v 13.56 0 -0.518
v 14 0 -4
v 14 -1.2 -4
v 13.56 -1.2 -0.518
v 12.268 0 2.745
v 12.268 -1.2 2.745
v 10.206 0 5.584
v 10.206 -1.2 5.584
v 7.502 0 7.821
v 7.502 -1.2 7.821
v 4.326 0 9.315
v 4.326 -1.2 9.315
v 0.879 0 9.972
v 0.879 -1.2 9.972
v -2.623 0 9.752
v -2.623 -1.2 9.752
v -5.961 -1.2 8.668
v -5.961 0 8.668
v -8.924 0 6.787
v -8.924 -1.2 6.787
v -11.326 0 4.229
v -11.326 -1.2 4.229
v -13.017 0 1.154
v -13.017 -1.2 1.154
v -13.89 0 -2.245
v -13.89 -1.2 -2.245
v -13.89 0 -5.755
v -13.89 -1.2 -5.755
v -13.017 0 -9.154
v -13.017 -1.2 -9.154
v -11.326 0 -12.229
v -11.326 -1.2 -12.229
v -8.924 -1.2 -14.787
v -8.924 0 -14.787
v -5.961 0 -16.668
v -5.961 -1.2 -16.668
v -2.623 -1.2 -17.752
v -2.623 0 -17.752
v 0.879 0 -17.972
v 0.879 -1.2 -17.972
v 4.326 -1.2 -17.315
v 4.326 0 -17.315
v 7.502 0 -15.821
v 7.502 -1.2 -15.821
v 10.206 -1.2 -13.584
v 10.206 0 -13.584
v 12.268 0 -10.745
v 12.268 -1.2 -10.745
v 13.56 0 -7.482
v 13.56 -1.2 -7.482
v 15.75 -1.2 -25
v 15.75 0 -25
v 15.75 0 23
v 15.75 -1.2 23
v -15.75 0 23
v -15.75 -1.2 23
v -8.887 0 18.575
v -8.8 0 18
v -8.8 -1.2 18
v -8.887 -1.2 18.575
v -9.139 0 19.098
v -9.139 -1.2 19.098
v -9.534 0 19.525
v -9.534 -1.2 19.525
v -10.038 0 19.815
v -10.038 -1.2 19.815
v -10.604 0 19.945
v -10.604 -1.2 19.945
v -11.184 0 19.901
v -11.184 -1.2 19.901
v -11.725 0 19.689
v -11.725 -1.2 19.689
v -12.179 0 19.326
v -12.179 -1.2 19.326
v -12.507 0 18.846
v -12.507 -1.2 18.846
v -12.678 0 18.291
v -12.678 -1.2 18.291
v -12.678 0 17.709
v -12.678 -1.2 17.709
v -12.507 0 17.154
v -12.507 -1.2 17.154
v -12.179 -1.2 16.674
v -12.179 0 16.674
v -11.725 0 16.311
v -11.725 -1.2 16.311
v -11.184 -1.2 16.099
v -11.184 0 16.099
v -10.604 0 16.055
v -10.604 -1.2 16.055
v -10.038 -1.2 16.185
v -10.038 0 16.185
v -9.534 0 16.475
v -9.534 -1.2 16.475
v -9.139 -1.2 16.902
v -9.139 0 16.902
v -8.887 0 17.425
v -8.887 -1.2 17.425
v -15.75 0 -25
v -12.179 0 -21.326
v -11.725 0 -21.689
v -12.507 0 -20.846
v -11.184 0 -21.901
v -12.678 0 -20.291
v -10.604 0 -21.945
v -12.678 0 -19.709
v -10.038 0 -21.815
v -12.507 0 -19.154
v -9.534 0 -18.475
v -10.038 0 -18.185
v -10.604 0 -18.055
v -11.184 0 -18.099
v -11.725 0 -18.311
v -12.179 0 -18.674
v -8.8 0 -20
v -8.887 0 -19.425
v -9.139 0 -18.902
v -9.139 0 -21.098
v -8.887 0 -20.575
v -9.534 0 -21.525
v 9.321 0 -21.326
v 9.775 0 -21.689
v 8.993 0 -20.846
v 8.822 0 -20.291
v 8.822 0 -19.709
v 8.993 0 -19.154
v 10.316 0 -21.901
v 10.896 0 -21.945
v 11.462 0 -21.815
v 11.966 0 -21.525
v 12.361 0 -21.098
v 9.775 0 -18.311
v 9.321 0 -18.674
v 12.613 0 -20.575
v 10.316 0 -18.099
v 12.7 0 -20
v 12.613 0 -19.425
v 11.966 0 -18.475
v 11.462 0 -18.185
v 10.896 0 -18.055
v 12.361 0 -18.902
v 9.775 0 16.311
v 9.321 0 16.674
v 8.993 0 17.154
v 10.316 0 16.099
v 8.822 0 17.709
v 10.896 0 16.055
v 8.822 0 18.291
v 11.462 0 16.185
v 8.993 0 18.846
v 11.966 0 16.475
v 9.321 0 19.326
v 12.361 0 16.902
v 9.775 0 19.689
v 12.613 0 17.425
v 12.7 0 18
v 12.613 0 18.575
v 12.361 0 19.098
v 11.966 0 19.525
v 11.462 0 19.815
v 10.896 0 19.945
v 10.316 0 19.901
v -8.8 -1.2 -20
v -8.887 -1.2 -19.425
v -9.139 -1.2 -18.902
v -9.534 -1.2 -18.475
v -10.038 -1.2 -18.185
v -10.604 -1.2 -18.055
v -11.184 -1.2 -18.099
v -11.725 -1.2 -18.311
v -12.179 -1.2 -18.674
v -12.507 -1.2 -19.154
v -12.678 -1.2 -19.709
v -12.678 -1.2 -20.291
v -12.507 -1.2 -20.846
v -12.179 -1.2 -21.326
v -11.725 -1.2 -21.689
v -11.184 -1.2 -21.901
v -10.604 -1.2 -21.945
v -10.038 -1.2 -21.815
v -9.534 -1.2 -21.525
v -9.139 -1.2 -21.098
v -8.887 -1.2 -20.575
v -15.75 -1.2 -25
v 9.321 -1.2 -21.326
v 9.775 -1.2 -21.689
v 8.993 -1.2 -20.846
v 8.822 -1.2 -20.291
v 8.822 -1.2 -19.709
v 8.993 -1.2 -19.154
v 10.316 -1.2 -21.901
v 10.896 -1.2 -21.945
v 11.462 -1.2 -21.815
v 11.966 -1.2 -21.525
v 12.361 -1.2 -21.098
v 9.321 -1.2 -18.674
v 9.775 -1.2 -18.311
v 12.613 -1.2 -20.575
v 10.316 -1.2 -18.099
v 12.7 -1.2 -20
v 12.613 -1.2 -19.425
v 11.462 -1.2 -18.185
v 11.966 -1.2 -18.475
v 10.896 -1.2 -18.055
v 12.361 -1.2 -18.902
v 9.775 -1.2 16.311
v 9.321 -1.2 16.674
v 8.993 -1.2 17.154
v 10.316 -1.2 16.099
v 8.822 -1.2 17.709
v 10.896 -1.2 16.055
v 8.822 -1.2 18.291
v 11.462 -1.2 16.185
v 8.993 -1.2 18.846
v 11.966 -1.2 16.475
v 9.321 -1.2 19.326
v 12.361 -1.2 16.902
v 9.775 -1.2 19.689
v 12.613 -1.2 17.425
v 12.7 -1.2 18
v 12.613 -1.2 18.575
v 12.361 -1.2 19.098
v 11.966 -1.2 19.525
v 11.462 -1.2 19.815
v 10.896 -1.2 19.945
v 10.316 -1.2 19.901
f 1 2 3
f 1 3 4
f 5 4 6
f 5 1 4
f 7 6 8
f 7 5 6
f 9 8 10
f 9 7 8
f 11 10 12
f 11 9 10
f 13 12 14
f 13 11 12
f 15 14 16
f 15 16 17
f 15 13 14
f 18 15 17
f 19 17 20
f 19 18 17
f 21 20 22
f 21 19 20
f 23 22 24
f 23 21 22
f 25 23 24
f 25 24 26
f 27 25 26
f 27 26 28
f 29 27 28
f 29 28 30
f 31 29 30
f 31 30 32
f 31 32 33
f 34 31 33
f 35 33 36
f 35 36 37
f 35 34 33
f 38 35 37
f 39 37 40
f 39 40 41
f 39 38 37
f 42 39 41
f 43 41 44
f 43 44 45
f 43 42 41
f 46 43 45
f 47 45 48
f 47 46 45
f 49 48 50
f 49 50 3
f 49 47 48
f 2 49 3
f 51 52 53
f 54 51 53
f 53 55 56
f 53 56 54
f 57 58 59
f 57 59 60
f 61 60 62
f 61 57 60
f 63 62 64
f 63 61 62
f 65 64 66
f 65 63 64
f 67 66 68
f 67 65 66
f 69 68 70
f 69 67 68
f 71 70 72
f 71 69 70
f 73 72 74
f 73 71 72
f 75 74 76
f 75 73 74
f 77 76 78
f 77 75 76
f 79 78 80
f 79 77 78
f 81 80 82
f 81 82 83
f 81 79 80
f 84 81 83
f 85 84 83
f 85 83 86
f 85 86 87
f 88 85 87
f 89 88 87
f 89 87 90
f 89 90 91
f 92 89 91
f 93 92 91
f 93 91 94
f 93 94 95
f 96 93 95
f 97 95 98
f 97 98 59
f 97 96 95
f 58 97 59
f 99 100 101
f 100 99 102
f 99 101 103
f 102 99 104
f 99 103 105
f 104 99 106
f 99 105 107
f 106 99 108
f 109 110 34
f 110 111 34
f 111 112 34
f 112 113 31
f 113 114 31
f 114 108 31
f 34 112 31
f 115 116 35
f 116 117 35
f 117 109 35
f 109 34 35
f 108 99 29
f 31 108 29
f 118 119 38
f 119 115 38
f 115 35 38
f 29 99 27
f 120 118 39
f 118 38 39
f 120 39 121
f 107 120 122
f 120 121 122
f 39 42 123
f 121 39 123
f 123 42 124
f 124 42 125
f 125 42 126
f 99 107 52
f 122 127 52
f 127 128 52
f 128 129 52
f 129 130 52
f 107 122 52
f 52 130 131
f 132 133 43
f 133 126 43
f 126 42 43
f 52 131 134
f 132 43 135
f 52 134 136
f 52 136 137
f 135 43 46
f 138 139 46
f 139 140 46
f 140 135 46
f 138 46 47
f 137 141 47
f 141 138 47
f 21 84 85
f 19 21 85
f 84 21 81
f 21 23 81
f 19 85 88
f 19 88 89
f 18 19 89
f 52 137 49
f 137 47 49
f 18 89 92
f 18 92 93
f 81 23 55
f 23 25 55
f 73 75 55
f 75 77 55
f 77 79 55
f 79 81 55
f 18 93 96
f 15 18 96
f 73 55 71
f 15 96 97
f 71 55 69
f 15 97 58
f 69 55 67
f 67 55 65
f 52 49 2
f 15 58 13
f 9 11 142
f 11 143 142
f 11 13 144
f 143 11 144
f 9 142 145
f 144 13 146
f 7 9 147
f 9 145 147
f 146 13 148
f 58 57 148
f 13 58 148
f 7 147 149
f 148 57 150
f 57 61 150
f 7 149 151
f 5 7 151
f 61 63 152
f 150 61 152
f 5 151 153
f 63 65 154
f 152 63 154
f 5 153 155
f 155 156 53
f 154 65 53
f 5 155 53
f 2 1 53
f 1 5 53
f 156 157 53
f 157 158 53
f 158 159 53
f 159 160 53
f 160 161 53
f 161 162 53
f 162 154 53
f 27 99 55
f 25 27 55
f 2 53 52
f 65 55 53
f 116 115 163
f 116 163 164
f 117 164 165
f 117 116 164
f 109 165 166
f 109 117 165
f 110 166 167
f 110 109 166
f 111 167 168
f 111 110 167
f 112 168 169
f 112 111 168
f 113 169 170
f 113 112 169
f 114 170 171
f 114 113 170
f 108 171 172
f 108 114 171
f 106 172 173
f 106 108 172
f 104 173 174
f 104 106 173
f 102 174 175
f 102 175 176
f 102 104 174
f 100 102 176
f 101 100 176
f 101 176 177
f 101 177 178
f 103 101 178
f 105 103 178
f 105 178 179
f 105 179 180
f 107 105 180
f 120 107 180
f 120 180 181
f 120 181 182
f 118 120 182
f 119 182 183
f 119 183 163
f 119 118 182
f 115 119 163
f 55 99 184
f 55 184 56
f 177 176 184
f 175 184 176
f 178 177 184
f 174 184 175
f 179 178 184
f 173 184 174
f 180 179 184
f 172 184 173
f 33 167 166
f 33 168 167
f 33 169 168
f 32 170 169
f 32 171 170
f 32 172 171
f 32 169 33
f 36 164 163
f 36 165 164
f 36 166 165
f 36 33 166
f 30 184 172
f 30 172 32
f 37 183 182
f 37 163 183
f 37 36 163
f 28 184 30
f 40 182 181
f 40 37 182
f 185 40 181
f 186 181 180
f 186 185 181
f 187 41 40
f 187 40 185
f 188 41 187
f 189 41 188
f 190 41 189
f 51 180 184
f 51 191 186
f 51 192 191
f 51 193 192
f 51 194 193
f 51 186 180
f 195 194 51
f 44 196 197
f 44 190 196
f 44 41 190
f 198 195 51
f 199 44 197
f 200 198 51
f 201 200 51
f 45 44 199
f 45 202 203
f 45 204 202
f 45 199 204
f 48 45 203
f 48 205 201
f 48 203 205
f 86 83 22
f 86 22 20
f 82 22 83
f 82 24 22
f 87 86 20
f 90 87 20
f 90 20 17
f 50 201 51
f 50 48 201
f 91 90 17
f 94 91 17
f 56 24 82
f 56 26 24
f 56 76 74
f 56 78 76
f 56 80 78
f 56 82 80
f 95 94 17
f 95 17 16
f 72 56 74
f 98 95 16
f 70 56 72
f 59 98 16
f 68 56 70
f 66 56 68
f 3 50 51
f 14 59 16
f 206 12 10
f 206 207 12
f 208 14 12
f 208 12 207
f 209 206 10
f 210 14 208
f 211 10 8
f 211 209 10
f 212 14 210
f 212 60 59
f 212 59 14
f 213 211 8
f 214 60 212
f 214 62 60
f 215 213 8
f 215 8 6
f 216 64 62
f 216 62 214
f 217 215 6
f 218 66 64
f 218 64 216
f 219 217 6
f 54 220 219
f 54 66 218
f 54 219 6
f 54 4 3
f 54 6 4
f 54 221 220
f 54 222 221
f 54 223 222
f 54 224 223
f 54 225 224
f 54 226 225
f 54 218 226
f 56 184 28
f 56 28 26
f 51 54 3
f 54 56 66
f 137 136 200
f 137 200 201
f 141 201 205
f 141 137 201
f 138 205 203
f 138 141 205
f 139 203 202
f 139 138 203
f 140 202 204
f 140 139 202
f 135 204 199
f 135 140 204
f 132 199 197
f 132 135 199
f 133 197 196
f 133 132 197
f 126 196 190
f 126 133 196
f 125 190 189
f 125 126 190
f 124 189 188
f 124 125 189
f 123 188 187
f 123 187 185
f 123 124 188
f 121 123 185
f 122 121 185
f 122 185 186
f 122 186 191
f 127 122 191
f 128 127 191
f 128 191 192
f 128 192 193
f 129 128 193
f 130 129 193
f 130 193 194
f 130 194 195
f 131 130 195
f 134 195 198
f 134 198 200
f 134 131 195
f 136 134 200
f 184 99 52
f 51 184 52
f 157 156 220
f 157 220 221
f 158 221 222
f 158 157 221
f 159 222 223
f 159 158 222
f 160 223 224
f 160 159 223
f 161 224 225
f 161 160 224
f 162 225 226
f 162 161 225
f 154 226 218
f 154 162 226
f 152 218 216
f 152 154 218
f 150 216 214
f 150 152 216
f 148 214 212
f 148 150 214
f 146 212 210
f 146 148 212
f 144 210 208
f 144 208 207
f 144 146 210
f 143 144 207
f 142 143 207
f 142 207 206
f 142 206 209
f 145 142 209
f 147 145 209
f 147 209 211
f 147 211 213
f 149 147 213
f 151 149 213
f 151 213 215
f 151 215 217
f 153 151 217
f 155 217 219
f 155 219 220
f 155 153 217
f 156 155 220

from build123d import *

# Parameters (mm, degrees)
F0_W     = 31.5
F0_H     = 48
F0_R     = 1.95
F0_R_2   = 14
F1_DEPTH = 1.2


with BuildPart() as f1:
    # F0 (on Front) → F1 (new body)
    with BuildSketch(Plane.XZ):
        with Locations((0, -1)):
            Rectangle(F0_W, F0_H)
        with Locations((-10.75, -20)):
            Circle(F0_R, mode=Mode.SUBTRACT)
        with Locations((10.75, -20)):
            Circle(F0_R, mode=Mode.SUBTRACT)
        with Locations((0, -4)):
            Circle(F0_R_2, mode=Mode.SUBTRACT)
        with Locations((-10.75, 18)):
            Circle(F0_R, mode=Mode.SUBTRACT)
        with Locations((10.75, 18)):
            Circle(F0_R, mode=Mode.SUBTRACT)
    extrude(amount=F1_DEPTH)


solid = f1.part
